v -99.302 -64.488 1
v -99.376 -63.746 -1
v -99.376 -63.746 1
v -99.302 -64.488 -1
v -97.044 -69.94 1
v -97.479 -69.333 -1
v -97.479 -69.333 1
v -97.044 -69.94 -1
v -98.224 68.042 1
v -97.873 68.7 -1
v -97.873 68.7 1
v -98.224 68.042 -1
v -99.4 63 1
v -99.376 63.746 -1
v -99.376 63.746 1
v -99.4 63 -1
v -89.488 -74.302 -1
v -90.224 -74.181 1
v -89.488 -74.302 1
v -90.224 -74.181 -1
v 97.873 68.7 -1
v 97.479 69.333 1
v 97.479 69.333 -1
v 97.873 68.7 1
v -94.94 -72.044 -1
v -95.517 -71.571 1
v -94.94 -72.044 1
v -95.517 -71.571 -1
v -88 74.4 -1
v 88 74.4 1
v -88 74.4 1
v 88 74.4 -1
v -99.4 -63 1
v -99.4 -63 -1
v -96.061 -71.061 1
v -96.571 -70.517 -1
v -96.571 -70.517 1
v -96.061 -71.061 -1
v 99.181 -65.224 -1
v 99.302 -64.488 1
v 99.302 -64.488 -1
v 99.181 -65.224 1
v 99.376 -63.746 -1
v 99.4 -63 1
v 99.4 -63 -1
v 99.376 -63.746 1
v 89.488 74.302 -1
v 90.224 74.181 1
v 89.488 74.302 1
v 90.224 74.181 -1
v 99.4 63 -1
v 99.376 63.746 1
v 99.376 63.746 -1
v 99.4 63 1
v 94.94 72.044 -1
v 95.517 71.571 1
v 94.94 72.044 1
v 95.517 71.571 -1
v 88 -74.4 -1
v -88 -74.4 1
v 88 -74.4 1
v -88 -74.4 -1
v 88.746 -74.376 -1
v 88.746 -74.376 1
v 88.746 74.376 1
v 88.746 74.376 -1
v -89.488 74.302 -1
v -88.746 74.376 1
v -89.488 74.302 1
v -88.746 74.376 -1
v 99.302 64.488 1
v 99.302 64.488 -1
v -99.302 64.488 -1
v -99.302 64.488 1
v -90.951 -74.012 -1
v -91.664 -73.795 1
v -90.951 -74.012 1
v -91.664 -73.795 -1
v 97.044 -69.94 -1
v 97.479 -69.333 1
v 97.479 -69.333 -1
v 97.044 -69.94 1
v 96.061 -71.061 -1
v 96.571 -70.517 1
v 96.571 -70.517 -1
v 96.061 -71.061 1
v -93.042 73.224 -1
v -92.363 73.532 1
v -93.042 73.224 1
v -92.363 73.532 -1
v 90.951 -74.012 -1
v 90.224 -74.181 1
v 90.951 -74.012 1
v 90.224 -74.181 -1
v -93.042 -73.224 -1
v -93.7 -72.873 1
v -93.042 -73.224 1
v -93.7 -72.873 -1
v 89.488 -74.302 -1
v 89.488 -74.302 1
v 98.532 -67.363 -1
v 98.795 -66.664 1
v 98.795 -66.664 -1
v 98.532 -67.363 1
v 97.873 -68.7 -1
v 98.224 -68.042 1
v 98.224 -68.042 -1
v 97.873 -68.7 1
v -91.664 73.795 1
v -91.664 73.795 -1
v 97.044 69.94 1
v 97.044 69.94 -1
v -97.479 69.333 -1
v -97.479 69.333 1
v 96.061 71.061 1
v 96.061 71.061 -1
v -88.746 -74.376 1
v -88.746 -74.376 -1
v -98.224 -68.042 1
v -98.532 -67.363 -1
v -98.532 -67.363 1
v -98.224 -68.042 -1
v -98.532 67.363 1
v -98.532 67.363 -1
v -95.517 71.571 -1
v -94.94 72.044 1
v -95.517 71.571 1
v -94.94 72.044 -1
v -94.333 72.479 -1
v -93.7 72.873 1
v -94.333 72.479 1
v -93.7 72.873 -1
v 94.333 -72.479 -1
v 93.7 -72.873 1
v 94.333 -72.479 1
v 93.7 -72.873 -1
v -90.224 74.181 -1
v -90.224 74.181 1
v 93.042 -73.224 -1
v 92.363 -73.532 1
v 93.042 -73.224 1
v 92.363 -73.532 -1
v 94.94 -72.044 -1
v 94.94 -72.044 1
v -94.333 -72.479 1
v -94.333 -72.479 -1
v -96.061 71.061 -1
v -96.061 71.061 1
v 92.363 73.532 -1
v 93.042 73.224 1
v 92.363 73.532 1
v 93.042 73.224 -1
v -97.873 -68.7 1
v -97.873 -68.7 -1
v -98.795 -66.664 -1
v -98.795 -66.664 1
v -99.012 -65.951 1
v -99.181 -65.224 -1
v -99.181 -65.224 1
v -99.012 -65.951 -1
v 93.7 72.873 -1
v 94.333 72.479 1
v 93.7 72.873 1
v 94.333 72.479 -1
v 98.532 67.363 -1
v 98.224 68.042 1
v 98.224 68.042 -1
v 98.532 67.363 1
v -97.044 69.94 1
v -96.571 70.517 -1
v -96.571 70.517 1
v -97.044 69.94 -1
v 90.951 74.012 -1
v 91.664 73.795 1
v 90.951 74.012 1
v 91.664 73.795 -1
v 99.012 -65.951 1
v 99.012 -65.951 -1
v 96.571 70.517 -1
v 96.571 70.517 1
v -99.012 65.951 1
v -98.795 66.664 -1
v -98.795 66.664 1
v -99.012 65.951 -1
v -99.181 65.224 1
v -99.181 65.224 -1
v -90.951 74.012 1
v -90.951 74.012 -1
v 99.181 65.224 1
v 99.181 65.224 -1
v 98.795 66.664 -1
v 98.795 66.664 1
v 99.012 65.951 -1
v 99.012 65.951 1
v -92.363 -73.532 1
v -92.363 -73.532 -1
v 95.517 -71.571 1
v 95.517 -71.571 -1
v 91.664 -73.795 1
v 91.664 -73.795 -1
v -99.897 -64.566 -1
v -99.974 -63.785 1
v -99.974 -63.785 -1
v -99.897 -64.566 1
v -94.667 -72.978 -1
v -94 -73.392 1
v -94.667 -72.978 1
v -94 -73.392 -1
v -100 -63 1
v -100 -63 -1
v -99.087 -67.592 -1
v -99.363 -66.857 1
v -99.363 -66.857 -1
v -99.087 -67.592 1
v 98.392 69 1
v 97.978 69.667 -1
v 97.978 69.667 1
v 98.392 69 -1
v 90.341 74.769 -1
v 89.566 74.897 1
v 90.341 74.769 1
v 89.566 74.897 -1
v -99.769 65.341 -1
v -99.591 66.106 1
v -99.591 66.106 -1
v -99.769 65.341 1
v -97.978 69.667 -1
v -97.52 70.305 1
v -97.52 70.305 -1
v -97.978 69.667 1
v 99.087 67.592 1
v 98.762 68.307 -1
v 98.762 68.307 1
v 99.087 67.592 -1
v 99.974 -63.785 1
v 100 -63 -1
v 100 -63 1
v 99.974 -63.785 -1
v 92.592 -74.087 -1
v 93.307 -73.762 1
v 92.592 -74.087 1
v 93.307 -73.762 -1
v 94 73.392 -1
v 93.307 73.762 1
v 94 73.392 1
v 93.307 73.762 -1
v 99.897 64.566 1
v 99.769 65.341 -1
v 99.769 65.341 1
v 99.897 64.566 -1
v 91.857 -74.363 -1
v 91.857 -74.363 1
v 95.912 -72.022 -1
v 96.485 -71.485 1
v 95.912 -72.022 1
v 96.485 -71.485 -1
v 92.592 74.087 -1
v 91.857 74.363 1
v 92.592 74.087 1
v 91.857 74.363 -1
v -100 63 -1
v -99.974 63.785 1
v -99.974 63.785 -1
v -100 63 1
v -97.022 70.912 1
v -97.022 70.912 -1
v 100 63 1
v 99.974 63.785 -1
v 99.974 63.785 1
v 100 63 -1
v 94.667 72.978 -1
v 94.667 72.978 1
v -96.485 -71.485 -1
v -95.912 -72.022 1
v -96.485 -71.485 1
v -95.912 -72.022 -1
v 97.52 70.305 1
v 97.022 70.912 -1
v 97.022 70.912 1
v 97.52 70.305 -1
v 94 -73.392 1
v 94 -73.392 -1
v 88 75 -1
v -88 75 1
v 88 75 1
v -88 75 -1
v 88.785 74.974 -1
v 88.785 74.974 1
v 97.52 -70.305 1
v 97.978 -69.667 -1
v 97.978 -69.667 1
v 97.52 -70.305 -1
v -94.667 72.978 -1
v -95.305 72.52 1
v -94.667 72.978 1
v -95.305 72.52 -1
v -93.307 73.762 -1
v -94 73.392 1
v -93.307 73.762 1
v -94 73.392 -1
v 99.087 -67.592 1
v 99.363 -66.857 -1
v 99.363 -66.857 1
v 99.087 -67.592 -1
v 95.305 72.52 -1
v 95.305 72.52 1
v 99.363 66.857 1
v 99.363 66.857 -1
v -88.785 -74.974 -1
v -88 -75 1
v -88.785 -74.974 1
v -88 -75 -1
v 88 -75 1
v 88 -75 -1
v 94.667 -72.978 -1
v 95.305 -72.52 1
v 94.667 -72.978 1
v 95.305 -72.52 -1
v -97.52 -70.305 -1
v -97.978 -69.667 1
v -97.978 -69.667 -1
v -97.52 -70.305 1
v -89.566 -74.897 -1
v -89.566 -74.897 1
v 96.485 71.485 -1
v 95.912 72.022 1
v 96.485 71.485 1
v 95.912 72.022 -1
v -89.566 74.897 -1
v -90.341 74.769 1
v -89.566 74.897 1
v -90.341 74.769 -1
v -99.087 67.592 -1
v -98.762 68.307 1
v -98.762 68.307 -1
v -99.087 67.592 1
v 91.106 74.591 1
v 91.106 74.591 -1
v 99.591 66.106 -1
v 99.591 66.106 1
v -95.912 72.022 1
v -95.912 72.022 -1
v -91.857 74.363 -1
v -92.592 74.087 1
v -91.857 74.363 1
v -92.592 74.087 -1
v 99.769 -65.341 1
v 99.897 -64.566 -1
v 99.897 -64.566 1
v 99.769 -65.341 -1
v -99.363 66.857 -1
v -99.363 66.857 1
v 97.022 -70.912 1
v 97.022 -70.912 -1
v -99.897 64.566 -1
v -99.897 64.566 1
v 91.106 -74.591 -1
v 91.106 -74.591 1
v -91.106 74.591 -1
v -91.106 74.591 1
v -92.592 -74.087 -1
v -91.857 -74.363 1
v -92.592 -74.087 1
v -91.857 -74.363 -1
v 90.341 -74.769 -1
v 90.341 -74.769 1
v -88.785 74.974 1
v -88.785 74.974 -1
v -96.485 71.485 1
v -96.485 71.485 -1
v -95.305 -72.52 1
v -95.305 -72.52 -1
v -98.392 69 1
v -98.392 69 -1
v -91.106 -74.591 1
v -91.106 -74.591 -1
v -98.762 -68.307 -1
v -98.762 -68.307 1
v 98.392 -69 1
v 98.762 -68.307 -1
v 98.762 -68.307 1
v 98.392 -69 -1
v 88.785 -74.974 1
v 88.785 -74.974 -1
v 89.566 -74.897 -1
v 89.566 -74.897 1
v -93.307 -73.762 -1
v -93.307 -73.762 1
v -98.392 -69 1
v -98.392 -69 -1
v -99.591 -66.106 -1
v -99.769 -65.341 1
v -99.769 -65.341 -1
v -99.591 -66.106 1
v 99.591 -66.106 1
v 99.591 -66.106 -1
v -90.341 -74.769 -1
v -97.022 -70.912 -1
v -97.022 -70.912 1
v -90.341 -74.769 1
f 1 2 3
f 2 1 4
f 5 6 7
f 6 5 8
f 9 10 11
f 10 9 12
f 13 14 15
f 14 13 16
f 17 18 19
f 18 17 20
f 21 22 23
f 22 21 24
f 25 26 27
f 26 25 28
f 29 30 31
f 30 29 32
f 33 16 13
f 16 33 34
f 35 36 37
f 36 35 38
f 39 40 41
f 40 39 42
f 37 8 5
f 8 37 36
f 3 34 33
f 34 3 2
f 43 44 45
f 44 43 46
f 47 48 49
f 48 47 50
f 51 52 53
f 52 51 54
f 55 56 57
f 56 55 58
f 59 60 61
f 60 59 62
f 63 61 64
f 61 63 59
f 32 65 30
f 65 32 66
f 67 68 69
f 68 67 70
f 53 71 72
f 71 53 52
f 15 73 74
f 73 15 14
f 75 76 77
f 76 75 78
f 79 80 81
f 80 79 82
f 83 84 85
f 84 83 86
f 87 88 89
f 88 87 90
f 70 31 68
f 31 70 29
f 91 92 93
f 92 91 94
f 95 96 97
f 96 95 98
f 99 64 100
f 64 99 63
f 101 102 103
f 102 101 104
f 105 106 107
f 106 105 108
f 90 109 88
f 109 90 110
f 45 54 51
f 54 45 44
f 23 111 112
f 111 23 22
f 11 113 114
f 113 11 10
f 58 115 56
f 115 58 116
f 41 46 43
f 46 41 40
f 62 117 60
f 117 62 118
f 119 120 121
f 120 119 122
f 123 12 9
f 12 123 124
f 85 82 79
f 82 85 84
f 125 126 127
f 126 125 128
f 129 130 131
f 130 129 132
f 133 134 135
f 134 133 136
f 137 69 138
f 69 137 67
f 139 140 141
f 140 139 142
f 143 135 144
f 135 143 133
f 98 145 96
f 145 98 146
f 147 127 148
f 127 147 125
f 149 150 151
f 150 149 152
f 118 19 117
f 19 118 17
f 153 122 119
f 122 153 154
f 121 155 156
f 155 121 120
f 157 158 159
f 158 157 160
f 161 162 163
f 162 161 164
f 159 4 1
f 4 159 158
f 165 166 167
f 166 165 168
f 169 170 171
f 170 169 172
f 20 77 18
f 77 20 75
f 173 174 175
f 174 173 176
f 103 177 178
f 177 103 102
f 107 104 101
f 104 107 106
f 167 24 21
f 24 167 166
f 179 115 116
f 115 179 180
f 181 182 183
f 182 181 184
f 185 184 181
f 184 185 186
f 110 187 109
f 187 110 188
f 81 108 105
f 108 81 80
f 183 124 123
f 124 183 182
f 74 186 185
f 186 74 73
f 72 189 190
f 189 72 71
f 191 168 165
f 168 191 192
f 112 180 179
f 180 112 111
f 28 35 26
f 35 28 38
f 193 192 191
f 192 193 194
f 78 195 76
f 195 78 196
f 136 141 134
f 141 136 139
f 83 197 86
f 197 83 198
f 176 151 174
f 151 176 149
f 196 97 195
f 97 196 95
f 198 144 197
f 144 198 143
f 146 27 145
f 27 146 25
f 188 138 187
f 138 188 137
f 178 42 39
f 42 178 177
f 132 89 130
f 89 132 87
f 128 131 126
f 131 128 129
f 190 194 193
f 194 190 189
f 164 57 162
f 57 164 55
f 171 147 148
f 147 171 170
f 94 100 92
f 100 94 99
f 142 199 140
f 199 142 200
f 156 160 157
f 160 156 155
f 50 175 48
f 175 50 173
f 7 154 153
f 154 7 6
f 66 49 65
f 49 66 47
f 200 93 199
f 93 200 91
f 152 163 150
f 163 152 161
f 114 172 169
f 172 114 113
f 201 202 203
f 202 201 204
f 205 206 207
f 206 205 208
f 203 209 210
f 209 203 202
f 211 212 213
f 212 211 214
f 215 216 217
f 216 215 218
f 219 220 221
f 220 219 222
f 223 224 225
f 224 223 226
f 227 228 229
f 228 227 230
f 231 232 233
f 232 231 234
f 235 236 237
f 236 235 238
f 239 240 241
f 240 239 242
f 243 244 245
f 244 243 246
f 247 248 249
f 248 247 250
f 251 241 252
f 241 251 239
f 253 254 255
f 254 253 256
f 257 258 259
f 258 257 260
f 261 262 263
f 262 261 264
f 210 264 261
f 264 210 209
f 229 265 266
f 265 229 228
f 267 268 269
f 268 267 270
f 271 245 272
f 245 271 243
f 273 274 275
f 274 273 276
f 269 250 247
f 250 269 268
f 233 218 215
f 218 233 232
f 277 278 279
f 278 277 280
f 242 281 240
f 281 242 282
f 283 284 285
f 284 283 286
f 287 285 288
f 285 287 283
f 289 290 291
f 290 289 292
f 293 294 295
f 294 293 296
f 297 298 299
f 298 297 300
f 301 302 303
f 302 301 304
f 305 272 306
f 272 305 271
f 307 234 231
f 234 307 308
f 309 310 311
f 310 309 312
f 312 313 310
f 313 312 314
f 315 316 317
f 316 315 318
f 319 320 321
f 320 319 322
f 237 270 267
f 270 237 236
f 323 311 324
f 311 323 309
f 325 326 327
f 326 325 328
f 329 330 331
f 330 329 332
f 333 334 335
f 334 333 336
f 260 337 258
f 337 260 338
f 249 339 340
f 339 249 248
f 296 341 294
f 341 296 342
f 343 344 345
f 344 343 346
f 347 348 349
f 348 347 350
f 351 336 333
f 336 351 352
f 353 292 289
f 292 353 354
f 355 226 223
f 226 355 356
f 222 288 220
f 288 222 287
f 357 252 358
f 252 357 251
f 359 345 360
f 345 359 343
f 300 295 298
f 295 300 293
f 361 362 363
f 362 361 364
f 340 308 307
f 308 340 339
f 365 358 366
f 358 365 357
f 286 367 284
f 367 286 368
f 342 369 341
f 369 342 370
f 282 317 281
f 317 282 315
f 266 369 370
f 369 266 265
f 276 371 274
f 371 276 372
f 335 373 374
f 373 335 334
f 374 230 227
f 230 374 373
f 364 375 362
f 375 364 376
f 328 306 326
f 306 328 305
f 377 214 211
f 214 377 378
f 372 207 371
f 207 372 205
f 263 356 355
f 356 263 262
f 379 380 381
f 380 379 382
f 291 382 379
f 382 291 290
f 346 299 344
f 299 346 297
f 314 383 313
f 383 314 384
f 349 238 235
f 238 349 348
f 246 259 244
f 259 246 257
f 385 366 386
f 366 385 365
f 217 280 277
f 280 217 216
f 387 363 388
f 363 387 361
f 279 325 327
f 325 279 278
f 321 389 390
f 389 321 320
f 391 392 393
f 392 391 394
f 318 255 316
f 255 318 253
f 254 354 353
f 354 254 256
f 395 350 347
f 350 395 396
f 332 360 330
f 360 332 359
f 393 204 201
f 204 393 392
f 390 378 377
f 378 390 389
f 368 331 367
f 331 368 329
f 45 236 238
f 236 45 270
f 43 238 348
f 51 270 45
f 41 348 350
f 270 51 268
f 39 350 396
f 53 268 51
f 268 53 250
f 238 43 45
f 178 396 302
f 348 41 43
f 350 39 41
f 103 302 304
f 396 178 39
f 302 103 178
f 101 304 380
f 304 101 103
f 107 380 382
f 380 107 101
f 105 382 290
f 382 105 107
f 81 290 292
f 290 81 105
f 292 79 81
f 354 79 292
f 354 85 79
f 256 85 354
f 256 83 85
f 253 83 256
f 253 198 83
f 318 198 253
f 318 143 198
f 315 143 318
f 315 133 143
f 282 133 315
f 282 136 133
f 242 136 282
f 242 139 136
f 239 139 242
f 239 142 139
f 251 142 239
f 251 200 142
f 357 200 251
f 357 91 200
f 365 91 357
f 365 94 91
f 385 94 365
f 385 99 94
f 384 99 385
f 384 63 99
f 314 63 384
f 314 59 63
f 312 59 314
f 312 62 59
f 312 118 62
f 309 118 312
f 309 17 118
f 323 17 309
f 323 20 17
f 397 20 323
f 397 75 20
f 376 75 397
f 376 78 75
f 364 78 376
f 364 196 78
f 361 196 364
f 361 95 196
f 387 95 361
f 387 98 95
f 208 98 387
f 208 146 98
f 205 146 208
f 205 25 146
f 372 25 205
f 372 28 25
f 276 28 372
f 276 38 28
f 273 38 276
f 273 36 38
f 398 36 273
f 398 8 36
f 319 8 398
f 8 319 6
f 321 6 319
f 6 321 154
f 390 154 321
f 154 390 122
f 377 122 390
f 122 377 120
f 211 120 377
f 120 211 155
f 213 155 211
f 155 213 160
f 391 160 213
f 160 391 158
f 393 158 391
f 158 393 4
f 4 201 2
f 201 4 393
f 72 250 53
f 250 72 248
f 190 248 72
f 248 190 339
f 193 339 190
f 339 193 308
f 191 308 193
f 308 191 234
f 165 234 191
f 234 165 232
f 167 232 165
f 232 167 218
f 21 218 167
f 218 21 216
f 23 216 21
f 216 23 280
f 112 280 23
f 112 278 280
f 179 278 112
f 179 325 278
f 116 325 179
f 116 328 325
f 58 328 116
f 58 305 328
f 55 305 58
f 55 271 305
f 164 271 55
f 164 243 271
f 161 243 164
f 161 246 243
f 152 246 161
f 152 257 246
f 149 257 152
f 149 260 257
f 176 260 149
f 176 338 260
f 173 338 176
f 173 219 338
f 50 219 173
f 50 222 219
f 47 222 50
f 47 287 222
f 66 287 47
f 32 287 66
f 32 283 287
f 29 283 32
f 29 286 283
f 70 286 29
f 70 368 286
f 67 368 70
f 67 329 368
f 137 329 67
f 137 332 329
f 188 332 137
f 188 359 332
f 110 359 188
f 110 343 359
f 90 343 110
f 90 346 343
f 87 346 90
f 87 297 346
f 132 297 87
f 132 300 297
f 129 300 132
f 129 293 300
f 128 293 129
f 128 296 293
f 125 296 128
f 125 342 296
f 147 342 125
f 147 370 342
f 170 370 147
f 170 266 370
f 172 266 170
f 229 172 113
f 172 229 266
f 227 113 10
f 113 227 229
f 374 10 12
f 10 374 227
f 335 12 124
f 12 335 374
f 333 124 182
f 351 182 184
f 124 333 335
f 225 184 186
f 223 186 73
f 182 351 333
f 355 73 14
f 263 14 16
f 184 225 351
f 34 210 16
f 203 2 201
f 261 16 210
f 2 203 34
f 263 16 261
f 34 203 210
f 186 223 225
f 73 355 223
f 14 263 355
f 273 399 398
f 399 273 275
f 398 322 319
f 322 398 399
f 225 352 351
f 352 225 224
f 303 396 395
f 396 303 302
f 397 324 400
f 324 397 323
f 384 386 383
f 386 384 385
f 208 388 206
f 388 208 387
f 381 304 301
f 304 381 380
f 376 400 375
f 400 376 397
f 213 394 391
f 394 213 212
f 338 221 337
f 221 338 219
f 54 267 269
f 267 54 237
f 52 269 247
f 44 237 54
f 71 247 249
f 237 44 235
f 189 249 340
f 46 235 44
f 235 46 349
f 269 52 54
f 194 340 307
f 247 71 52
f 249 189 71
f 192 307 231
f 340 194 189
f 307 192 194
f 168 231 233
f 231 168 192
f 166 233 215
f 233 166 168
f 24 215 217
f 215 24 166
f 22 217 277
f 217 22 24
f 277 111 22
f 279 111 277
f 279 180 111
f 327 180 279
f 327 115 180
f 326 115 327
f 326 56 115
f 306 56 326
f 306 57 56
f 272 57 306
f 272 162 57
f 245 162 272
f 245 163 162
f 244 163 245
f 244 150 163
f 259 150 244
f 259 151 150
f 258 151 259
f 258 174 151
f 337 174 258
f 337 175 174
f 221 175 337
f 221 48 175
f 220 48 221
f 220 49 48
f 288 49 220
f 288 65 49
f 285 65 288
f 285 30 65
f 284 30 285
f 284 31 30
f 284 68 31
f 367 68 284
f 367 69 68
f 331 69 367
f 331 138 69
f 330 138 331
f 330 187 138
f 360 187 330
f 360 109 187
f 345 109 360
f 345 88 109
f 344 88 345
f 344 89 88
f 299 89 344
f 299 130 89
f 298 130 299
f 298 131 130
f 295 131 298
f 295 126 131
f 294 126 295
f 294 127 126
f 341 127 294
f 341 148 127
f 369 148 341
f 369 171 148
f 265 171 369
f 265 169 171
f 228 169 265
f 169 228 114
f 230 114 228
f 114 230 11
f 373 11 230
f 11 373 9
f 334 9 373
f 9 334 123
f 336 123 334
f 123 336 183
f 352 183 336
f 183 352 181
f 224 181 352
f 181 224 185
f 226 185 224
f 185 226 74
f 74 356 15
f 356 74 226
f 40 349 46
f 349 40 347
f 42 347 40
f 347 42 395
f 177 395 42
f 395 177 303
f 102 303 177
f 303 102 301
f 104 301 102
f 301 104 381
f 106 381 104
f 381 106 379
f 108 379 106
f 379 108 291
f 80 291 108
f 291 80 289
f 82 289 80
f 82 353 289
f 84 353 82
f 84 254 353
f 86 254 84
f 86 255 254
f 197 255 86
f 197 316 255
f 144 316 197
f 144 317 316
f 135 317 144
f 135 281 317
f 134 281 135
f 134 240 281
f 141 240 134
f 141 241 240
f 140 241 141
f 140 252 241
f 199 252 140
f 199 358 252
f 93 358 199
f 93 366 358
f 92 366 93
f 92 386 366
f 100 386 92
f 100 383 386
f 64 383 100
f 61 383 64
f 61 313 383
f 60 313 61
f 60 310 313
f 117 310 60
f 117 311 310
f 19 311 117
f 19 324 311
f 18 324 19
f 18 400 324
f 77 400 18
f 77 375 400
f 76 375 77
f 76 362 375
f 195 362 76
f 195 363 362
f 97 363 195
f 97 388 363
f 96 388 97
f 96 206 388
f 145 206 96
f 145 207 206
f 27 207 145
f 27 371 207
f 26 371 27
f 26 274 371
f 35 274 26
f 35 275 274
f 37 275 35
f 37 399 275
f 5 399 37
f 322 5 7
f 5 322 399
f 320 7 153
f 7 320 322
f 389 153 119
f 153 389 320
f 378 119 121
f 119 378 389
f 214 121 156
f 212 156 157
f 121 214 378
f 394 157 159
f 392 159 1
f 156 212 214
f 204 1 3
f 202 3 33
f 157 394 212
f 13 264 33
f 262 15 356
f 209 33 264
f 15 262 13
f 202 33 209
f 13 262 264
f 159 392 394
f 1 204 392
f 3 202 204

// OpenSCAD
$fn = 96;

// Parameters
sheet_length = 200; //[100:400:1]
sheet_width = 150;  //[75:300:1]
sheet_thickness = 2; //[1:4:0.1]
corner_radius = 12; //[6:24:1]
edge_chamfer = 0.6; //[0.2:1.2:0.1]
texture_depth = 0.15; //[0.05:0.4:0.05]
texture_pitch = 12; //[6:24:1]
texture_radius = 2.5; //[1.5:5:0.1]
overlap = 1; //[0.5:2:0.1]

// Helpers
function clamp(v, lo, hi) = v < lo ? lo : (v > hi ? hi : v);
cr = clamp(corner_radius, 0, min(sheet_length, sheet_width)/2 - 0.01);
ch = clamp(edge_chamfer, 0, min(sheet_length, sheet_width)/2 - 0.01);
td = clamp(texture_depth, 0, sheet_thickness - 0.01);

// Rounded rectangle 2D
module rounded_rect_2d(L, W, R) {
  hull() {
    for (sx = [-1, 1], sy = [-1, 1])
      translate([sx*(L/2 - R), sy*(W/2 - R)]) circle(r=R);
  }
}

// Base sheet with rounded corners (single connected solid)
module sheet_base() {
  linear_extrude(height=sheet_thickness, center=true, convexity=10)
    rounded_rect_2d(sheet_length, sheet_width, cr);
}

// Edge chamfer approximation: subtract a slightly smaller rounded slab from top+bottom
module edge_chamfer_cut() {
  // Keep at least a tiny footprint so we don't erase the whole sheet
  innerL = max(0.01, sheet_length - 2*ch);
  innerW = max(0.01, sheet_width  - 2*ch);
  innerR = max(0.01, cr - ch);

  union() {
    // Top cut
    translate([0, 0, sheet_thickness/2 - ch/2])
      linear_extrude(height=ch + 2*overlap, center=true, convexity=10)
        rounded_rect_2d(innerL, innerW, innerR);

    // Bottom cut
    translate([0, 0, -sheet_thickness/2 + ch/2])
      linear_extrude(height=ch + 2*overlap, center=true, convexity=10)
        rounded_rect_2d(innerL, innerW, innerR);
  }
}

// Texture dimples (subtractive), placed on top surface
module surface_texture(x_offset, y_offset) {
  translate([x_offset, y_offset, sheet_thickness/2 - td/2])
    cylinder(r=texture_radius, h=td + 2*overlap, center=true);
}

module sheet_textured() {
  difference() {
    difference() {
      sheet_base();
      edge_chamfer_cut();
    }

    // 2x2 sample texture (kept from original intent)
    surface_texture(-texture_pitch/2, -texture_pitch/2);
    surface_texture( texture_pitch/2, -texture_pitch/2);
    surface_texture(-texture_pitch/2,  texture_pitch/2);
    surface_texture( texture_pitch/2,  texture_pitch/2);
  }
}

// Final output
color([0.85, 0.85, 0.8])
sheet_textured();
